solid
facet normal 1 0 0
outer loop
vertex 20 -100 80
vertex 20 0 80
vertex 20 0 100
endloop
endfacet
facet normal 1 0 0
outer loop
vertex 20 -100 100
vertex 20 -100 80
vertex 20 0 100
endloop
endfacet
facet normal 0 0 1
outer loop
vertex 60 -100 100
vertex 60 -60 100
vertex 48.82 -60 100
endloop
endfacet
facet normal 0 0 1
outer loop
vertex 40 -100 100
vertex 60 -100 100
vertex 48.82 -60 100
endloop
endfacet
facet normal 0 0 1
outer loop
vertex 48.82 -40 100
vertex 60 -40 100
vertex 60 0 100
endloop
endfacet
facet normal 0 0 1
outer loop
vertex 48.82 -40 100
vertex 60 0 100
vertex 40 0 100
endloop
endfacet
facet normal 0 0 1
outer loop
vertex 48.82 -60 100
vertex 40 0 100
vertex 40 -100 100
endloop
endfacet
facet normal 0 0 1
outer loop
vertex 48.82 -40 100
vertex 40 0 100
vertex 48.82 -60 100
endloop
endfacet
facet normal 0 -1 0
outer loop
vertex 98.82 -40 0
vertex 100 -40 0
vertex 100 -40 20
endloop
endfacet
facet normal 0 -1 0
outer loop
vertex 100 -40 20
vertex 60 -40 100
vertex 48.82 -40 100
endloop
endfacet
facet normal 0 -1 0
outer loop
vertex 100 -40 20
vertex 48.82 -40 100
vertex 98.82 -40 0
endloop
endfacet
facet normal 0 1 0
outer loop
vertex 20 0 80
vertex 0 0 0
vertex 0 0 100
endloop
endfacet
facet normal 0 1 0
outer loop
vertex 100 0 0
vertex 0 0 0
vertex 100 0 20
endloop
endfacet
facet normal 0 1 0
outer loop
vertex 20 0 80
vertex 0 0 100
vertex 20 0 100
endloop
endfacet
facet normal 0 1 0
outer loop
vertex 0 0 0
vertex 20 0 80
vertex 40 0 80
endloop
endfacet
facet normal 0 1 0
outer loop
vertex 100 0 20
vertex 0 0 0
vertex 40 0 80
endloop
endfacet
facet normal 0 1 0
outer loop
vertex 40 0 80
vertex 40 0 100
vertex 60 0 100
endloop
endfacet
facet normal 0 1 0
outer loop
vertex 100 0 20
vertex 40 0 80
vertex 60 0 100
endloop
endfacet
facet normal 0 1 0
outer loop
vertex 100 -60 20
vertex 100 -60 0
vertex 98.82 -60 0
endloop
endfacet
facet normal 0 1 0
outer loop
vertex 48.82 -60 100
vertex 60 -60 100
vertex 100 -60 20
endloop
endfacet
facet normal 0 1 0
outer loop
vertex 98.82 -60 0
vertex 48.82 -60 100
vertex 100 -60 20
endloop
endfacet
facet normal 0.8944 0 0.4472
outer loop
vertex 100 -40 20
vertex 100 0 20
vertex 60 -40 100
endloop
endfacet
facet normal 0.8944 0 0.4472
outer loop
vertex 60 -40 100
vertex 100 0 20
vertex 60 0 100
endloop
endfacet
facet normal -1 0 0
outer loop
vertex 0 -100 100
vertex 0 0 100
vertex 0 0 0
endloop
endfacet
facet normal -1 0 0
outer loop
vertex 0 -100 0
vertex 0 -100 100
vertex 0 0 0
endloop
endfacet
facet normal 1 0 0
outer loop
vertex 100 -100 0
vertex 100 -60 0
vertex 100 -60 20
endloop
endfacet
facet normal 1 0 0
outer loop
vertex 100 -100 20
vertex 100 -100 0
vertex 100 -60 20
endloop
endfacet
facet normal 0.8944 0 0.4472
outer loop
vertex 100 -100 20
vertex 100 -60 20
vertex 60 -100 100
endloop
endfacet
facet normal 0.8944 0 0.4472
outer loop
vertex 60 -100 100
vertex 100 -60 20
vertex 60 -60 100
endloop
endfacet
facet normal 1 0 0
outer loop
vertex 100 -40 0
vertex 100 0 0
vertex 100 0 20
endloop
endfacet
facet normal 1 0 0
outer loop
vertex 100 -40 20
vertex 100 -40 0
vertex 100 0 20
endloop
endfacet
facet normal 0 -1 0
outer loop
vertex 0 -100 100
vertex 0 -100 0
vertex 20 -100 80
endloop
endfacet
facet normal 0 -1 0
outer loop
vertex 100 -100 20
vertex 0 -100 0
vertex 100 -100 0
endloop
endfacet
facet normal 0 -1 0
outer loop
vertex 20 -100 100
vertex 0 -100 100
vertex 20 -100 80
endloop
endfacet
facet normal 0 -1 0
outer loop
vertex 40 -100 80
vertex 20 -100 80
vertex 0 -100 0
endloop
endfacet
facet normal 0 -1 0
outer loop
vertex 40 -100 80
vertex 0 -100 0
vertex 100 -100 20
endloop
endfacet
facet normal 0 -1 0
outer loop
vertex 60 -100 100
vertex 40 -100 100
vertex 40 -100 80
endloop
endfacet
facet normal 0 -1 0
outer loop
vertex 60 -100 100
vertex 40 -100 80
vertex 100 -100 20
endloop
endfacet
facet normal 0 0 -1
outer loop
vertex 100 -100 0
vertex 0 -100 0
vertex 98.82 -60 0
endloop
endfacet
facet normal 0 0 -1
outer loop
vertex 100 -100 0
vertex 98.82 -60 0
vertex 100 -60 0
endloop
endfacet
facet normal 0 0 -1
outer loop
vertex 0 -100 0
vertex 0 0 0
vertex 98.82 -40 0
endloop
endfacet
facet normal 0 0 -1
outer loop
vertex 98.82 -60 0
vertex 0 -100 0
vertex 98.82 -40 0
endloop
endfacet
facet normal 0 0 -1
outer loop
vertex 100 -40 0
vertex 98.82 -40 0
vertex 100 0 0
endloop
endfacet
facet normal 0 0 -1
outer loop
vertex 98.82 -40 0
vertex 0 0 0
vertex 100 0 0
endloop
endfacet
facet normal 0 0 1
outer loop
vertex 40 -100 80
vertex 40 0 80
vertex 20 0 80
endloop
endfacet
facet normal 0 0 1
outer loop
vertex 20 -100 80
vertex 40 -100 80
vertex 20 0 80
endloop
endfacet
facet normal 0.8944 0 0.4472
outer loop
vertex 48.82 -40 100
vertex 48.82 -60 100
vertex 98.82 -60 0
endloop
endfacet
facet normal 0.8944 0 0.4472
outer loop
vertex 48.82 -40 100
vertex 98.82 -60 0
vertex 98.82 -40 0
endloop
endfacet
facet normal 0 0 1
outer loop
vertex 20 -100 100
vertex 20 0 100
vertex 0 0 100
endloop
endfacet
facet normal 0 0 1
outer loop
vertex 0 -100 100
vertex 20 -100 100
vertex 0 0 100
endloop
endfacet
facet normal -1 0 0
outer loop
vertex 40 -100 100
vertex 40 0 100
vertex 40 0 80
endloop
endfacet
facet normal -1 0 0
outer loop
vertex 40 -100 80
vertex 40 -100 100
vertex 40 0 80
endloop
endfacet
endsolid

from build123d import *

# Parameters (mm, degrees)
F1_DEPTH = 100
F2_W     = 20
F2_H     = 89.4427191
F3_DEPTH = 10
F4_DEPTH = 10
F5_DEPTH = 10
F6_DEPTH = 10


with BuildPart() as f1:
    # F0 (on Front) → F1 (new body)
    with BuildSketch(Plane.XZ):
        Polygon((0, 100), (0, 0), (100, 0), (100, 20), (60, 100), (40, 100), (40, 80), (20, 80), (20, 100), align=None)
    extrude(amount=F1_DEPTH)

    # F2 (on face) → F3 (cut)
    with BuildSketch(Plane(origin=(88, 0, 44), x_dir=(0, 1, 0), z_dir=(0.894427191, 0, 0.4472135955))):
        with Locations((-50, 17.88854382)):
            Rectangle(F2_W, F2_H)
    extrude(amount=-F3_DEPTH, mode=Mode.SUBTRACT)

    # F4 (cut): a face of the model
    f4_faces = [f1.faces().sort_by_distance(p)[0] for p in [
        (55.527864045, -50, 97.7639320225),
    ]]
    extrude(f4_faces, amount=-F4_DEPTH, mode=Mode.SUBTRACT)

    # F5 (cut): a face of the model
    f5_faces = [f1.faces().sort_by_distance(p)[0] for p in [
        (95.527864045, -50, 17.7639320225),
    ]]
    extrude(f5_faces, amount=-F5_DEPTH, mode=Mode.SUBTRACT)

    # F6 (cut): a face of the model
    f6_faces = [f1.faces().sort_by_distance(p)[0] for p in [
        (97.7639320225, -50, 7.7016261238),
    ]]
    extrude(f6_faces, amount=-F6_DEPTH, mode=Mode.SUBTRACT)


solid = f1.part
